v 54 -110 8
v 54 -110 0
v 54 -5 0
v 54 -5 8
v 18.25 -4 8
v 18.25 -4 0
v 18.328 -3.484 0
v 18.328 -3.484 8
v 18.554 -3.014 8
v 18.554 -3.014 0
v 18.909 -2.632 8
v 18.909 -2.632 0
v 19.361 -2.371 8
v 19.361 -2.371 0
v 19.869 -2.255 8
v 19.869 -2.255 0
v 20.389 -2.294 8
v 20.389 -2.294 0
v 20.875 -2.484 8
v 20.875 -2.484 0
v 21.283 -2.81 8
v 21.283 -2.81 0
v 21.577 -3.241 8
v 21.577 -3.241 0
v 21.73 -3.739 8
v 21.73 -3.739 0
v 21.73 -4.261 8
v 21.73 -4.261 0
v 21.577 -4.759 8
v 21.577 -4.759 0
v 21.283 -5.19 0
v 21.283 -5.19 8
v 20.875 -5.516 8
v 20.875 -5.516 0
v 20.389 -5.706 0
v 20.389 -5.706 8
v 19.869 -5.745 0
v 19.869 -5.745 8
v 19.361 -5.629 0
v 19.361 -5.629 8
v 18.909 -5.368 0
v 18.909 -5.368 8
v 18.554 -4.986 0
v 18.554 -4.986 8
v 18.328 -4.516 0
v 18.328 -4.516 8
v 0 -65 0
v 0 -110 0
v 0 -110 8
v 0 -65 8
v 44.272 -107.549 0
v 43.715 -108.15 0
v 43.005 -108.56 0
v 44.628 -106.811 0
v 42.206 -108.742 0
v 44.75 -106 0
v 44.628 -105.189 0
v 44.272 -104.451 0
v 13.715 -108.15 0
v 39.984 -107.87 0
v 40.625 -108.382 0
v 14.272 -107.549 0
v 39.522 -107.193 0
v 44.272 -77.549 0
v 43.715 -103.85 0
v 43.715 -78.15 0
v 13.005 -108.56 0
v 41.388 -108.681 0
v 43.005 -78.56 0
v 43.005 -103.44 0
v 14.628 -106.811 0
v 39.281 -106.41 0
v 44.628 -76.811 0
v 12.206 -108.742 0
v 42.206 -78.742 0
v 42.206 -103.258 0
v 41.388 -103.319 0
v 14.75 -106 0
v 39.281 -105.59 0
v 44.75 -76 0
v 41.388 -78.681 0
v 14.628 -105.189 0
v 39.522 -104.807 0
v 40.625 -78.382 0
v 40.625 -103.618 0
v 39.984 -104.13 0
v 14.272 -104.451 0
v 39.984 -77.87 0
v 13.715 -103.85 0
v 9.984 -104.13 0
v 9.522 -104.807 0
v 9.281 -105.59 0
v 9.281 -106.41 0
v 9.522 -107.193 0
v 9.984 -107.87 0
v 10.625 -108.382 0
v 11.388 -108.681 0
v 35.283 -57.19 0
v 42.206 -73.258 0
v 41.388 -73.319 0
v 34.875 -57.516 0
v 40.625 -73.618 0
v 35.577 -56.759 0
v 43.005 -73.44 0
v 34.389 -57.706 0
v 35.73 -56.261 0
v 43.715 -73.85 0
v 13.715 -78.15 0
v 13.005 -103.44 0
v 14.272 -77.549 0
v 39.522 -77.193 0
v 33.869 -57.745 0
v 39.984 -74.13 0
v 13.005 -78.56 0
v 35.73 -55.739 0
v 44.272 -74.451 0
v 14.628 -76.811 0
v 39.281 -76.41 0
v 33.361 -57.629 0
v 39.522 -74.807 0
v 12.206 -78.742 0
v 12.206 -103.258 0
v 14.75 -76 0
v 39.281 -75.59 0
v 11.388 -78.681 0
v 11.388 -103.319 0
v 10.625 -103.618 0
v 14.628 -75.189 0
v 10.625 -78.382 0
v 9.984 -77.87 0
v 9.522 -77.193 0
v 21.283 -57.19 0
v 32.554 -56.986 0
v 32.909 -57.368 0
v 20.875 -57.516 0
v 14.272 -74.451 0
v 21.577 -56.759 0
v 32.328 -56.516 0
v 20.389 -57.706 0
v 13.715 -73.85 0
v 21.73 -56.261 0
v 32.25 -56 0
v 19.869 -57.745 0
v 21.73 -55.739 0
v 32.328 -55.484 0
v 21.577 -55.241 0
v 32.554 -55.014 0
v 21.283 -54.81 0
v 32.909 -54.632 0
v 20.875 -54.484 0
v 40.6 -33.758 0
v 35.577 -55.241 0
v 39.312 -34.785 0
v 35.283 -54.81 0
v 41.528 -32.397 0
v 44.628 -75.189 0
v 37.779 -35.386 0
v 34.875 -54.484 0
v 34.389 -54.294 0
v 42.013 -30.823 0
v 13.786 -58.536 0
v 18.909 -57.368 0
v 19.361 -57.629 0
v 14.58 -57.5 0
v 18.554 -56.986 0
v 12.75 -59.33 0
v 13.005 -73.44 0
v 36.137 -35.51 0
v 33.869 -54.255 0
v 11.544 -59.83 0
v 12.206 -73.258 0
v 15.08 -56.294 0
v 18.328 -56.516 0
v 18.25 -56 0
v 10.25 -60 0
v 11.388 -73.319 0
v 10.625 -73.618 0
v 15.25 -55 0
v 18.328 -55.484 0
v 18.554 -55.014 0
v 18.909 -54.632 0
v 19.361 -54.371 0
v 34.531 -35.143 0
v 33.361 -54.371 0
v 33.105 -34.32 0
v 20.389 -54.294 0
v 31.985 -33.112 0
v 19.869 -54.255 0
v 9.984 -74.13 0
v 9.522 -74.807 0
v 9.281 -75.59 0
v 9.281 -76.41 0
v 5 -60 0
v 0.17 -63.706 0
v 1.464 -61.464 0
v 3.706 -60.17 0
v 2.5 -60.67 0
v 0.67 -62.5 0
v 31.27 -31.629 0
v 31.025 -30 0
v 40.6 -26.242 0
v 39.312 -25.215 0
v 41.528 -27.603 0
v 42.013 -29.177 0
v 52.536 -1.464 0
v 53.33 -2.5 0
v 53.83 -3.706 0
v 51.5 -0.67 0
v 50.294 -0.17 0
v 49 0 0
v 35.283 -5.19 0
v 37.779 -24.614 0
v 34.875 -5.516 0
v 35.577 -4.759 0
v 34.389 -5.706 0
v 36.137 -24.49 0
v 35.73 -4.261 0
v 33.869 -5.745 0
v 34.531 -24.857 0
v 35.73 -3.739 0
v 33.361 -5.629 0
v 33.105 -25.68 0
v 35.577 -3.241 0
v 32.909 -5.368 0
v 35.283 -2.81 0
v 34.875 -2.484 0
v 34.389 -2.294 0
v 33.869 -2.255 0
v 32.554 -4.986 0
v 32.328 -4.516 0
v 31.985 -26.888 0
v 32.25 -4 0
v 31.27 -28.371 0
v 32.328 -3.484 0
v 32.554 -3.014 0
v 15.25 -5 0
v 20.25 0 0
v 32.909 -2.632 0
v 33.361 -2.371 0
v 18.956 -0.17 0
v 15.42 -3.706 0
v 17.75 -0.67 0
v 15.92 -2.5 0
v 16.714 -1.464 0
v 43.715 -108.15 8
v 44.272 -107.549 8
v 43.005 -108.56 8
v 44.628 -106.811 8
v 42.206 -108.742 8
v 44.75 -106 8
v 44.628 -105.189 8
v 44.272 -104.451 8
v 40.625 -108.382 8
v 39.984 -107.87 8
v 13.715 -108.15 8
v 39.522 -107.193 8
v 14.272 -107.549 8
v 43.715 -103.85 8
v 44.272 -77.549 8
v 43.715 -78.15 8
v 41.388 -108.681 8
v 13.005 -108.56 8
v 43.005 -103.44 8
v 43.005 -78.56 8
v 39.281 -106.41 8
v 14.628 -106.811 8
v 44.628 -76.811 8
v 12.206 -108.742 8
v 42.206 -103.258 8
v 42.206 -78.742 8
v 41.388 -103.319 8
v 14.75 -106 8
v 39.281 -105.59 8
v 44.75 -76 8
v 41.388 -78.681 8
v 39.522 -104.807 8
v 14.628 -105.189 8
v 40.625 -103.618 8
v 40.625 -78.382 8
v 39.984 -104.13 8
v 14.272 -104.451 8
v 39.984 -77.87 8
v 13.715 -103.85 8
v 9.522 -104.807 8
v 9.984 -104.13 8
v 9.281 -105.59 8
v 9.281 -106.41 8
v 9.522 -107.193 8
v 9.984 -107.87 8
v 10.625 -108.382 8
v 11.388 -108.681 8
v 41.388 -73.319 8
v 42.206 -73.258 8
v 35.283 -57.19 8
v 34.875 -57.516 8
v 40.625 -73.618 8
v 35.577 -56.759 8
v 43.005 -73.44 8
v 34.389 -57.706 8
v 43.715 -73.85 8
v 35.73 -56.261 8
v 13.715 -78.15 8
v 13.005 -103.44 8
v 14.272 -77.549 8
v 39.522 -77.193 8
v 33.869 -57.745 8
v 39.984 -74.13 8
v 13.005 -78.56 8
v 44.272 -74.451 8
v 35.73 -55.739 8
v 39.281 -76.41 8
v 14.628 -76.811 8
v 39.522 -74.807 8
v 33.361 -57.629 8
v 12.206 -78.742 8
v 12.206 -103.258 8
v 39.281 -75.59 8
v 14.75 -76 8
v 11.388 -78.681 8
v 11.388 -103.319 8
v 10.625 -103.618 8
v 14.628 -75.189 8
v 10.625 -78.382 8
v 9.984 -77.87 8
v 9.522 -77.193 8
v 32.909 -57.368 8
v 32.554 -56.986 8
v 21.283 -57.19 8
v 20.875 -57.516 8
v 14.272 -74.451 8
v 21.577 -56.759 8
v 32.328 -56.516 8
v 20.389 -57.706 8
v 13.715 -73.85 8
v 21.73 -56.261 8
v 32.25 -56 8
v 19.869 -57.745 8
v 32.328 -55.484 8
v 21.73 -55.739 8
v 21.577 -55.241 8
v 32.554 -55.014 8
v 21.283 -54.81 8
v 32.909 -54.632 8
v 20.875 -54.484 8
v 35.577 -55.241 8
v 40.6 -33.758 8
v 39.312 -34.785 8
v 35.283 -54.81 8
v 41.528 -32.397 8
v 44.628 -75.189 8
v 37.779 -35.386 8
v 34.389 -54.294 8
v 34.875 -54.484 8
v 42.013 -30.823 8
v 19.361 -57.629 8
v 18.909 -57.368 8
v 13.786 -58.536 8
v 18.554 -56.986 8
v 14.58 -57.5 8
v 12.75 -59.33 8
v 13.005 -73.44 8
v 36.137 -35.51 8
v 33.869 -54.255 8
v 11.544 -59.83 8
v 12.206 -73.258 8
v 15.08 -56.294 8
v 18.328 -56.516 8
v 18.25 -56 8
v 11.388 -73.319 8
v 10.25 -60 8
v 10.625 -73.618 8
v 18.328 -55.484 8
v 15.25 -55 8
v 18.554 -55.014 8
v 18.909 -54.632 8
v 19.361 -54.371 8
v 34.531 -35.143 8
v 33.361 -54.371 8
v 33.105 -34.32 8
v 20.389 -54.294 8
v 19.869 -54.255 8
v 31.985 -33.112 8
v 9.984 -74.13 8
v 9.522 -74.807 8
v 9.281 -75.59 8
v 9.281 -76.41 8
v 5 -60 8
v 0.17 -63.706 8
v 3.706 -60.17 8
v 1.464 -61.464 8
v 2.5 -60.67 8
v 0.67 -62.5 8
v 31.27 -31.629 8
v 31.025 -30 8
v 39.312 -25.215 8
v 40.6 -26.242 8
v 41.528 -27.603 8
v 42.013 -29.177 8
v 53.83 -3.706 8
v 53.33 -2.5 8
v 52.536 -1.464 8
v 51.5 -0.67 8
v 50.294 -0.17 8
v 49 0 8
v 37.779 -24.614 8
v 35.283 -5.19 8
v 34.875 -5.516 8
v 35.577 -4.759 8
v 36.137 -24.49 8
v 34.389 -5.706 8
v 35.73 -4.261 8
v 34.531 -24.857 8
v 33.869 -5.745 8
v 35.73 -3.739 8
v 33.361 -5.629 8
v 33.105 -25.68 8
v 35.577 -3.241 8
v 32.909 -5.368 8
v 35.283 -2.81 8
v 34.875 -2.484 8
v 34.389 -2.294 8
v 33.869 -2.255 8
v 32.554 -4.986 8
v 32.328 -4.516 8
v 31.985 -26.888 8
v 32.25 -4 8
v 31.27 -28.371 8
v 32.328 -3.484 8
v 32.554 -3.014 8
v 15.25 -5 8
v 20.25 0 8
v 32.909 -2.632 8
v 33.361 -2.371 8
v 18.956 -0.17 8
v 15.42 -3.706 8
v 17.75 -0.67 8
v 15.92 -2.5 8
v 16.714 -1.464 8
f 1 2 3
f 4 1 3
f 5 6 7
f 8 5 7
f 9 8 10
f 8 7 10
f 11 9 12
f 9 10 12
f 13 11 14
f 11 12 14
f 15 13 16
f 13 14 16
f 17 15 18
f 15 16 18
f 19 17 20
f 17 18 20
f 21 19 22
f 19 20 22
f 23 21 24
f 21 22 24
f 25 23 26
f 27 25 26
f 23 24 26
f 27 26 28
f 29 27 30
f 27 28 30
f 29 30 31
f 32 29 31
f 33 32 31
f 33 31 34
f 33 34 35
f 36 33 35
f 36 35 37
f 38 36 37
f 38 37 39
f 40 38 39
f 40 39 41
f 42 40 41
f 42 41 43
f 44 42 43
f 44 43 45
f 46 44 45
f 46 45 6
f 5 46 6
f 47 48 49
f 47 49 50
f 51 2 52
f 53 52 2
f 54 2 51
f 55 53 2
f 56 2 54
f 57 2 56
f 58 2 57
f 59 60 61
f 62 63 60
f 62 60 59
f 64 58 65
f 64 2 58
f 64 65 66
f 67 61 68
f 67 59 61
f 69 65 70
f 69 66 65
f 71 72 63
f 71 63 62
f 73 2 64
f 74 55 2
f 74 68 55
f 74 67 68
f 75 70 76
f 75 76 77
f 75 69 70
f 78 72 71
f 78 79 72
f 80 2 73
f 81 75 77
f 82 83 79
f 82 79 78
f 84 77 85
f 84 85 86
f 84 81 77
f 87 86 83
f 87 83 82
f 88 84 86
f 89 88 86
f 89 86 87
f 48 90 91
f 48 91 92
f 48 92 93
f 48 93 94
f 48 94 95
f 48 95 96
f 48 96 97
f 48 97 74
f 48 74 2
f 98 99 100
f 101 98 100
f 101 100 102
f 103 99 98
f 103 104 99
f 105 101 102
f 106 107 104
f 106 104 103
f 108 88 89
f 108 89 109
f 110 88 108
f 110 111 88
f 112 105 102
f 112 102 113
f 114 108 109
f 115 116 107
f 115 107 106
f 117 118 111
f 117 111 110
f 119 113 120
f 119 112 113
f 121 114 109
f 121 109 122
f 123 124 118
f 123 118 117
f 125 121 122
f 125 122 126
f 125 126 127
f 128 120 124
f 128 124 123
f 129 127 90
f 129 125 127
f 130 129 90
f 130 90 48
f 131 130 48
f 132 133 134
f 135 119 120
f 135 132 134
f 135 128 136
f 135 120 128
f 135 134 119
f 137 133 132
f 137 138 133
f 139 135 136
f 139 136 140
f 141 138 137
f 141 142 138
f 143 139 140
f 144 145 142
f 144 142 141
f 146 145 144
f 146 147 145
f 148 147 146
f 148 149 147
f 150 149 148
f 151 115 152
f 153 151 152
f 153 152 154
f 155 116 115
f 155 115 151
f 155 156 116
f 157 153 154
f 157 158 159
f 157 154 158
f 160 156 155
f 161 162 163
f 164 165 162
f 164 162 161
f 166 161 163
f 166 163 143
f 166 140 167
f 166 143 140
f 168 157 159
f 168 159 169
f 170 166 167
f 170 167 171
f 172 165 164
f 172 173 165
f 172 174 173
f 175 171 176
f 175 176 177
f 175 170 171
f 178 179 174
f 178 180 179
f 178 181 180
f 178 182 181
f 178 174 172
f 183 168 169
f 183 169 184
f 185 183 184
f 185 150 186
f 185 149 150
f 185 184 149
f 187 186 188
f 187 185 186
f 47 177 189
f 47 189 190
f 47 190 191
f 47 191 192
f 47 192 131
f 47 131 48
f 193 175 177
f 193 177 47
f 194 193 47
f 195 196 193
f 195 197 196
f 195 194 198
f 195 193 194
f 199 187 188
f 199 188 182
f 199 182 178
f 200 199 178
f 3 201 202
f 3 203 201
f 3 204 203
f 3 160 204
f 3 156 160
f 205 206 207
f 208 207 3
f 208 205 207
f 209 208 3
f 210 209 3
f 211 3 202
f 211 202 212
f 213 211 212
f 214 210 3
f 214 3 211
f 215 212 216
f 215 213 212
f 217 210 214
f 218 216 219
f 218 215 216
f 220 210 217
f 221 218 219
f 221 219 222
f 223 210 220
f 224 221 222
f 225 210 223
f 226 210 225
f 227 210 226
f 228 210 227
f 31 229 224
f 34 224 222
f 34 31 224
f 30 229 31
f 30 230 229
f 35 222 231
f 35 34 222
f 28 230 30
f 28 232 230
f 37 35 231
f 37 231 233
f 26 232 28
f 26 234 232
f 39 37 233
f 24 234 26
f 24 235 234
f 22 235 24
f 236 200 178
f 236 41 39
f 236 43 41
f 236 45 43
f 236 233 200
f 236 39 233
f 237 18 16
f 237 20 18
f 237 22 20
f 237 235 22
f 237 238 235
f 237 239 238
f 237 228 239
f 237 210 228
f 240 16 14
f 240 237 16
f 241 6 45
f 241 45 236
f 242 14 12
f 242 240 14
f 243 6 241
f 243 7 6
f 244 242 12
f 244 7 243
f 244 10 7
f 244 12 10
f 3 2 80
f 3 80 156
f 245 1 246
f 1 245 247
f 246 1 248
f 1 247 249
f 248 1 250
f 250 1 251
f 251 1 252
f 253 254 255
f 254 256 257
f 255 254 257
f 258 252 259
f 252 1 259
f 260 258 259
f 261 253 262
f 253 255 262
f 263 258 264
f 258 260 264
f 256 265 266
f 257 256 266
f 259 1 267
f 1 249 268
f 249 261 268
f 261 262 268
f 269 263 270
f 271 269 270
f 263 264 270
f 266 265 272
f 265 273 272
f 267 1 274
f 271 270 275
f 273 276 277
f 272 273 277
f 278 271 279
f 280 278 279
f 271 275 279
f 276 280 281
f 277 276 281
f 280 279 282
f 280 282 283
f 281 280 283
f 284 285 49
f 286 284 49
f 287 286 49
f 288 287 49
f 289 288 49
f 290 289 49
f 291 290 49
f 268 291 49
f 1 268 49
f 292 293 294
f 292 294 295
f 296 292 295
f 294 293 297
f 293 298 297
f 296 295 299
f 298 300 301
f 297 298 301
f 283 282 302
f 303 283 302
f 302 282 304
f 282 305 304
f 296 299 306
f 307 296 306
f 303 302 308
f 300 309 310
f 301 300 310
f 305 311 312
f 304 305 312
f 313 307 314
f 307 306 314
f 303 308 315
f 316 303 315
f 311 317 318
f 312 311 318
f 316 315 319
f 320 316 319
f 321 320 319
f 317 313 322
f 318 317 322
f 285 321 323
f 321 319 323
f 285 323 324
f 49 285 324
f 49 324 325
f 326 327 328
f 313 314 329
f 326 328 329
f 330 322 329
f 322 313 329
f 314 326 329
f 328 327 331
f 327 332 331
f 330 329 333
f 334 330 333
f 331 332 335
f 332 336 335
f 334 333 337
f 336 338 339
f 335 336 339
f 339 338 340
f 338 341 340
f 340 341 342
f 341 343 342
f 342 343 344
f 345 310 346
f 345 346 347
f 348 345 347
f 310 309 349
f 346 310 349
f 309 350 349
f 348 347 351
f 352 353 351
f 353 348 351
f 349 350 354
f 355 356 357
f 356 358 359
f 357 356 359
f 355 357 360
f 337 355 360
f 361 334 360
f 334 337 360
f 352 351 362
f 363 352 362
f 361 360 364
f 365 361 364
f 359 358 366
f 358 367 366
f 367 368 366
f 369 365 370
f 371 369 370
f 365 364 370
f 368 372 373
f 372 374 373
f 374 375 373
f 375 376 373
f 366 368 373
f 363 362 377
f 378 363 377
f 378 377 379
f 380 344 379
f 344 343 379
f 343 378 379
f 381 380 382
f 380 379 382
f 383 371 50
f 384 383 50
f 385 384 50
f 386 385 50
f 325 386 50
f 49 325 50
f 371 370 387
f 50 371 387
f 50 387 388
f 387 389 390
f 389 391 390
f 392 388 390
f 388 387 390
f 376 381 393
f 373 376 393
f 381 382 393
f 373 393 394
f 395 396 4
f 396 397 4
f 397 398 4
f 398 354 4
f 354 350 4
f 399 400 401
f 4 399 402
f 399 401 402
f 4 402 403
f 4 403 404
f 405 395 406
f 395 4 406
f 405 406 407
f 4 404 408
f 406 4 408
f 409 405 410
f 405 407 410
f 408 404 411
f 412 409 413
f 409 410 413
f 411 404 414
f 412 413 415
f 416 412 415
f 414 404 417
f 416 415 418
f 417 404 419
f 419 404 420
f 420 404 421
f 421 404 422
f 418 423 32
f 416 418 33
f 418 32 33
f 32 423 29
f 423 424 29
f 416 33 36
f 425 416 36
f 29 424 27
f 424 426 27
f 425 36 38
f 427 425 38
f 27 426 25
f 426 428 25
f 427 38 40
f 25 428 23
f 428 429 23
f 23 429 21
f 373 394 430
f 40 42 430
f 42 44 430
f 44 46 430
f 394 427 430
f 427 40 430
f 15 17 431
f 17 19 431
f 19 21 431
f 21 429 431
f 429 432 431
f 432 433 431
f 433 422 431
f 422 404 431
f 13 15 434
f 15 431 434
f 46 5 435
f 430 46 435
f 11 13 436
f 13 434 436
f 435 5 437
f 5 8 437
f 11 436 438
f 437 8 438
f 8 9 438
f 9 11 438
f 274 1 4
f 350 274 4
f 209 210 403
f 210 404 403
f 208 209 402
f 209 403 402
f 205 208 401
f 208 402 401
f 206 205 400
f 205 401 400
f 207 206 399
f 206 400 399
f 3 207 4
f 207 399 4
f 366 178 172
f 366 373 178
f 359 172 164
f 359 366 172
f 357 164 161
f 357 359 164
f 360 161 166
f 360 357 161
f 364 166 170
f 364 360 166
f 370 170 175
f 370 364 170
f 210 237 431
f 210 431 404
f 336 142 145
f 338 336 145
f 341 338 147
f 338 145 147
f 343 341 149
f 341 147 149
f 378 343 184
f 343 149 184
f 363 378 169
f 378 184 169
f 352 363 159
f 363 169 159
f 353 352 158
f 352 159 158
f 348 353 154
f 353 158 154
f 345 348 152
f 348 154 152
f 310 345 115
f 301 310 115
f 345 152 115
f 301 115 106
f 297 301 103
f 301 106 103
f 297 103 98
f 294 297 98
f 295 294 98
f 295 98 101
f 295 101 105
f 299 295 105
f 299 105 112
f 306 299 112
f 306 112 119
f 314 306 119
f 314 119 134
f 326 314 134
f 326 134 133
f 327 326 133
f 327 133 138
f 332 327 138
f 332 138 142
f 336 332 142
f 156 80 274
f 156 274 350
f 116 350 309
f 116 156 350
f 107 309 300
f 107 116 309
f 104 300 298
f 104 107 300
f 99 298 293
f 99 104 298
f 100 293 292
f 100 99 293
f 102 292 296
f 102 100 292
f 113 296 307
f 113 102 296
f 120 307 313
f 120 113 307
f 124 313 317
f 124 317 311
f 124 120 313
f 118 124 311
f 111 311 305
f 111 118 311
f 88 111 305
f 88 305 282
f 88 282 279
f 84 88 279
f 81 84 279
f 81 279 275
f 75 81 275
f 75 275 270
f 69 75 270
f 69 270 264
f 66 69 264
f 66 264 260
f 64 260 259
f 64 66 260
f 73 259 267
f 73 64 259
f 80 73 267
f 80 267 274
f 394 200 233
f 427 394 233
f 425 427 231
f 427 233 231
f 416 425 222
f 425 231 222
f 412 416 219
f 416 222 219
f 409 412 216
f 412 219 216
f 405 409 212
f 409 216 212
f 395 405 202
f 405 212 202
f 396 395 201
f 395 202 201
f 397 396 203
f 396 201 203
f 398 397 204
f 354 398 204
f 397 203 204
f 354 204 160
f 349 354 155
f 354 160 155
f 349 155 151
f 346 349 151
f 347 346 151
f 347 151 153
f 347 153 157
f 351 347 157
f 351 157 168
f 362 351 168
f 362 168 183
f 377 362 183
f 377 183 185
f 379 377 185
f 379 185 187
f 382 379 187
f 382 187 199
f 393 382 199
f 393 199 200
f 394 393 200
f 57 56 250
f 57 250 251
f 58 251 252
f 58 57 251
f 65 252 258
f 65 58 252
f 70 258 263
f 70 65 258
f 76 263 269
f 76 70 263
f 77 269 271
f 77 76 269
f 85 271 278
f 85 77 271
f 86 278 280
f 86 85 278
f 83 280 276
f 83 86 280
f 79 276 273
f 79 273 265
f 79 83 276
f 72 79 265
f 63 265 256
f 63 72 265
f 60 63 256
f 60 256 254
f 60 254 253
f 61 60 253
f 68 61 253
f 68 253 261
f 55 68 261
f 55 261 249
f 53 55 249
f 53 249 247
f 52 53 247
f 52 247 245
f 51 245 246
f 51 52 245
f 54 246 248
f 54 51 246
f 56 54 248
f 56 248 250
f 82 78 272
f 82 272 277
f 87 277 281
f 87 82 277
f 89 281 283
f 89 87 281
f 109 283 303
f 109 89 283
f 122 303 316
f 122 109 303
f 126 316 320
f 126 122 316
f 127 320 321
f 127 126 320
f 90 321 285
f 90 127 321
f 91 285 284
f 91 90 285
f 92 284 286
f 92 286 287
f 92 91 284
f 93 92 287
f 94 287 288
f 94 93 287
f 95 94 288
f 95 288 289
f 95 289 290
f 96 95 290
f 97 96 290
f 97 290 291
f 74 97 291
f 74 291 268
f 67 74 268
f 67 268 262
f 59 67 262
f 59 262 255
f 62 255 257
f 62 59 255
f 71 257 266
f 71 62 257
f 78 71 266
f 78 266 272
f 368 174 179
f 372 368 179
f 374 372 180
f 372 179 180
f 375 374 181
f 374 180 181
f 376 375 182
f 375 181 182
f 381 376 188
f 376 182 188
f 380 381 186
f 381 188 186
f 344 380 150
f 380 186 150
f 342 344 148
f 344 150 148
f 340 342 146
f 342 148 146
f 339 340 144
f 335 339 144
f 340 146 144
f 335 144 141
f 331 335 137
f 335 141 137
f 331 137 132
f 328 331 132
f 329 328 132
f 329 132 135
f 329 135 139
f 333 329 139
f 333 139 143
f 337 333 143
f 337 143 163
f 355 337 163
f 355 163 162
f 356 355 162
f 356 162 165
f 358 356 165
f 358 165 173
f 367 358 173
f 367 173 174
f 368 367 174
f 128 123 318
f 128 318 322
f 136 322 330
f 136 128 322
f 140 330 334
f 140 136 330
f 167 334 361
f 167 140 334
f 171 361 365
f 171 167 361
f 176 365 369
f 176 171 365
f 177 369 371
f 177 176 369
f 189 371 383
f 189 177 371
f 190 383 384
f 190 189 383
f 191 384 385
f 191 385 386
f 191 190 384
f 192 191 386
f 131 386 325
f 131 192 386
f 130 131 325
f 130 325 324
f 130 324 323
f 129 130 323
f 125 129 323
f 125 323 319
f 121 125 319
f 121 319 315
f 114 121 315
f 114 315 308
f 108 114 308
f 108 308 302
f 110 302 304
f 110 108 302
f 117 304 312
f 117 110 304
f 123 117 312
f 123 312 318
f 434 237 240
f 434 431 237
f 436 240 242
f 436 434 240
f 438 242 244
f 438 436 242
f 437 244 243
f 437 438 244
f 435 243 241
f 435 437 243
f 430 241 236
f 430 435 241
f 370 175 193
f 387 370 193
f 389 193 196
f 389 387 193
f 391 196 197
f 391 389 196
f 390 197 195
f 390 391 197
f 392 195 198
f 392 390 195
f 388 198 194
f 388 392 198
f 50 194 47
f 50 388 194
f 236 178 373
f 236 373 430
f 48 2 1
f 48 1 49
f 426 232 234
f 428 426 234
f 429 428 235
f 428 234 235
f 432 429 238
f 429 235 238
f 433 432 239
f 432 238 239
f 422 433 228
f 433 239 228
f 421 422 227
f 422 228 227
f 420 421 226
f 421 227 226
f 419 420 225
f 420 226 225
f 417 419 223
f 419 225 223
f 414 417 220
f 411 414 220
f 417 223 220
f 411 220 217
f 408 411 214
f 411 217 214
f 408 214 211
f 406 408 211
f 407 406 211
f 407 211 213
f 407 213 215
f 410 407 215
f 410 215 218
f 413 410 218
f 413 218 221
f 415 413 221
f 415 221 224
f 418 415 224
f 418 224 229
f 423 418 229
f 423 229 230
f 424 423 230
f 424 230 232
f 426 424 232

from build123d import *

# Parameters (mm, degrees)
SKETCH_1_R          = 2.75
EXTRUDE_1_DEPTH     = 8
SKETCH_2_W          = 15.25
SKETCH_2_H          = 60
CUT_EXTRUDE_1_DEPTH = 10
FILLET_1_R          = 5
SKETCH_3_R          = 1.75
CUT_EXTRUDE_2_DEPTH = 123.800651464
SKETCH_4_R          = 5.525
CUT_EXTRUDE_3_DEPTH = 10


with BuildPart() as part:
    # 草图1 → 凸台-拉伸1 (new body)
    with BuildSketch(Plane.XY):
        Polygon((0, 0), (54, 0), (54, -52), (54, -110), (0, -110), align=None)
        with Locations((12, -106)):
            Circle(SKETCH_1_R, mode=Mode.SUBTRACT)
        with Locations((42, -106)):
            Circle(SKETCH_1_R, mode=Mode.SUBTRACT)
        with Locations((42, -76)):
            Circle(SKETCH_1_R, mode=Mode.SUBTRACT)
        with Locations((12, -76)):
            Circle(SKETCH_1_R, mode=Mode.SUBTRACT)
    extrude(amount=EXTRUDE_1_DEPTH)

    # 草图2 → 切除-拉伸1 (cut)
    with BuildSketch(Plane(origin=(0, 0, 0), x_dir=(-1, 0, 0), z_dir=(0, 0, -1))):
        with Locations((-7.625, -30)):
            Rectangle(SKETCH_2_W, SKETCH_2_H)
    extrude(amount=-CUT_EXTRUDE_1_DEPTH, mode=Mode.SUBTRACT)

    # 圆角1
    fillet_1_edges = [part.edges().sort_by_distance(p)[0] for p in [
        (15.25, 0, 4),
        (0, -60, 4),
        (15.25, -60, 4),
        (54, 0, 4),
    ]]
    fillet(fillet_1_edges, radius=FILLET_1_R)

    # 草图3 → 切除-拉伸2 (cut, through all)
    with BuildSketch(Plane(origin=(0, 0, 0), x_dir=(-1, 0, 0), z_dir=(0, 0, -1))):
        with Locations((-20, -4)):
            Circle(SKETCH_3_R)
        with Locations((-34, -4)):
            Circle(SKETCH_3_R)
        with Locations((-34, -56)):
            Circle(SKETCH_3_R)
        with Locations((-20, -56)):
            Circle(SKETCH_3_R)
    extrude(amount=-CUT_EXTRUDE_2_DEPTH, mode=Mode.SUBTRACT)

    # 草图4 → 切除-拉伸3 (cut)
    with BuildSketch(Plane(origin=(0, 0, 0), x_dir=(-1, 0, 0), z_dir=(0, 0, -1))):
        with Locations((-36.55, -30)):
            Circle(SKETCH_4_R)
    extrude(amount=-CUT_EXTRUDE_3_DEPTH, mode=Mode.SUBTRACT)


solid = part.part
